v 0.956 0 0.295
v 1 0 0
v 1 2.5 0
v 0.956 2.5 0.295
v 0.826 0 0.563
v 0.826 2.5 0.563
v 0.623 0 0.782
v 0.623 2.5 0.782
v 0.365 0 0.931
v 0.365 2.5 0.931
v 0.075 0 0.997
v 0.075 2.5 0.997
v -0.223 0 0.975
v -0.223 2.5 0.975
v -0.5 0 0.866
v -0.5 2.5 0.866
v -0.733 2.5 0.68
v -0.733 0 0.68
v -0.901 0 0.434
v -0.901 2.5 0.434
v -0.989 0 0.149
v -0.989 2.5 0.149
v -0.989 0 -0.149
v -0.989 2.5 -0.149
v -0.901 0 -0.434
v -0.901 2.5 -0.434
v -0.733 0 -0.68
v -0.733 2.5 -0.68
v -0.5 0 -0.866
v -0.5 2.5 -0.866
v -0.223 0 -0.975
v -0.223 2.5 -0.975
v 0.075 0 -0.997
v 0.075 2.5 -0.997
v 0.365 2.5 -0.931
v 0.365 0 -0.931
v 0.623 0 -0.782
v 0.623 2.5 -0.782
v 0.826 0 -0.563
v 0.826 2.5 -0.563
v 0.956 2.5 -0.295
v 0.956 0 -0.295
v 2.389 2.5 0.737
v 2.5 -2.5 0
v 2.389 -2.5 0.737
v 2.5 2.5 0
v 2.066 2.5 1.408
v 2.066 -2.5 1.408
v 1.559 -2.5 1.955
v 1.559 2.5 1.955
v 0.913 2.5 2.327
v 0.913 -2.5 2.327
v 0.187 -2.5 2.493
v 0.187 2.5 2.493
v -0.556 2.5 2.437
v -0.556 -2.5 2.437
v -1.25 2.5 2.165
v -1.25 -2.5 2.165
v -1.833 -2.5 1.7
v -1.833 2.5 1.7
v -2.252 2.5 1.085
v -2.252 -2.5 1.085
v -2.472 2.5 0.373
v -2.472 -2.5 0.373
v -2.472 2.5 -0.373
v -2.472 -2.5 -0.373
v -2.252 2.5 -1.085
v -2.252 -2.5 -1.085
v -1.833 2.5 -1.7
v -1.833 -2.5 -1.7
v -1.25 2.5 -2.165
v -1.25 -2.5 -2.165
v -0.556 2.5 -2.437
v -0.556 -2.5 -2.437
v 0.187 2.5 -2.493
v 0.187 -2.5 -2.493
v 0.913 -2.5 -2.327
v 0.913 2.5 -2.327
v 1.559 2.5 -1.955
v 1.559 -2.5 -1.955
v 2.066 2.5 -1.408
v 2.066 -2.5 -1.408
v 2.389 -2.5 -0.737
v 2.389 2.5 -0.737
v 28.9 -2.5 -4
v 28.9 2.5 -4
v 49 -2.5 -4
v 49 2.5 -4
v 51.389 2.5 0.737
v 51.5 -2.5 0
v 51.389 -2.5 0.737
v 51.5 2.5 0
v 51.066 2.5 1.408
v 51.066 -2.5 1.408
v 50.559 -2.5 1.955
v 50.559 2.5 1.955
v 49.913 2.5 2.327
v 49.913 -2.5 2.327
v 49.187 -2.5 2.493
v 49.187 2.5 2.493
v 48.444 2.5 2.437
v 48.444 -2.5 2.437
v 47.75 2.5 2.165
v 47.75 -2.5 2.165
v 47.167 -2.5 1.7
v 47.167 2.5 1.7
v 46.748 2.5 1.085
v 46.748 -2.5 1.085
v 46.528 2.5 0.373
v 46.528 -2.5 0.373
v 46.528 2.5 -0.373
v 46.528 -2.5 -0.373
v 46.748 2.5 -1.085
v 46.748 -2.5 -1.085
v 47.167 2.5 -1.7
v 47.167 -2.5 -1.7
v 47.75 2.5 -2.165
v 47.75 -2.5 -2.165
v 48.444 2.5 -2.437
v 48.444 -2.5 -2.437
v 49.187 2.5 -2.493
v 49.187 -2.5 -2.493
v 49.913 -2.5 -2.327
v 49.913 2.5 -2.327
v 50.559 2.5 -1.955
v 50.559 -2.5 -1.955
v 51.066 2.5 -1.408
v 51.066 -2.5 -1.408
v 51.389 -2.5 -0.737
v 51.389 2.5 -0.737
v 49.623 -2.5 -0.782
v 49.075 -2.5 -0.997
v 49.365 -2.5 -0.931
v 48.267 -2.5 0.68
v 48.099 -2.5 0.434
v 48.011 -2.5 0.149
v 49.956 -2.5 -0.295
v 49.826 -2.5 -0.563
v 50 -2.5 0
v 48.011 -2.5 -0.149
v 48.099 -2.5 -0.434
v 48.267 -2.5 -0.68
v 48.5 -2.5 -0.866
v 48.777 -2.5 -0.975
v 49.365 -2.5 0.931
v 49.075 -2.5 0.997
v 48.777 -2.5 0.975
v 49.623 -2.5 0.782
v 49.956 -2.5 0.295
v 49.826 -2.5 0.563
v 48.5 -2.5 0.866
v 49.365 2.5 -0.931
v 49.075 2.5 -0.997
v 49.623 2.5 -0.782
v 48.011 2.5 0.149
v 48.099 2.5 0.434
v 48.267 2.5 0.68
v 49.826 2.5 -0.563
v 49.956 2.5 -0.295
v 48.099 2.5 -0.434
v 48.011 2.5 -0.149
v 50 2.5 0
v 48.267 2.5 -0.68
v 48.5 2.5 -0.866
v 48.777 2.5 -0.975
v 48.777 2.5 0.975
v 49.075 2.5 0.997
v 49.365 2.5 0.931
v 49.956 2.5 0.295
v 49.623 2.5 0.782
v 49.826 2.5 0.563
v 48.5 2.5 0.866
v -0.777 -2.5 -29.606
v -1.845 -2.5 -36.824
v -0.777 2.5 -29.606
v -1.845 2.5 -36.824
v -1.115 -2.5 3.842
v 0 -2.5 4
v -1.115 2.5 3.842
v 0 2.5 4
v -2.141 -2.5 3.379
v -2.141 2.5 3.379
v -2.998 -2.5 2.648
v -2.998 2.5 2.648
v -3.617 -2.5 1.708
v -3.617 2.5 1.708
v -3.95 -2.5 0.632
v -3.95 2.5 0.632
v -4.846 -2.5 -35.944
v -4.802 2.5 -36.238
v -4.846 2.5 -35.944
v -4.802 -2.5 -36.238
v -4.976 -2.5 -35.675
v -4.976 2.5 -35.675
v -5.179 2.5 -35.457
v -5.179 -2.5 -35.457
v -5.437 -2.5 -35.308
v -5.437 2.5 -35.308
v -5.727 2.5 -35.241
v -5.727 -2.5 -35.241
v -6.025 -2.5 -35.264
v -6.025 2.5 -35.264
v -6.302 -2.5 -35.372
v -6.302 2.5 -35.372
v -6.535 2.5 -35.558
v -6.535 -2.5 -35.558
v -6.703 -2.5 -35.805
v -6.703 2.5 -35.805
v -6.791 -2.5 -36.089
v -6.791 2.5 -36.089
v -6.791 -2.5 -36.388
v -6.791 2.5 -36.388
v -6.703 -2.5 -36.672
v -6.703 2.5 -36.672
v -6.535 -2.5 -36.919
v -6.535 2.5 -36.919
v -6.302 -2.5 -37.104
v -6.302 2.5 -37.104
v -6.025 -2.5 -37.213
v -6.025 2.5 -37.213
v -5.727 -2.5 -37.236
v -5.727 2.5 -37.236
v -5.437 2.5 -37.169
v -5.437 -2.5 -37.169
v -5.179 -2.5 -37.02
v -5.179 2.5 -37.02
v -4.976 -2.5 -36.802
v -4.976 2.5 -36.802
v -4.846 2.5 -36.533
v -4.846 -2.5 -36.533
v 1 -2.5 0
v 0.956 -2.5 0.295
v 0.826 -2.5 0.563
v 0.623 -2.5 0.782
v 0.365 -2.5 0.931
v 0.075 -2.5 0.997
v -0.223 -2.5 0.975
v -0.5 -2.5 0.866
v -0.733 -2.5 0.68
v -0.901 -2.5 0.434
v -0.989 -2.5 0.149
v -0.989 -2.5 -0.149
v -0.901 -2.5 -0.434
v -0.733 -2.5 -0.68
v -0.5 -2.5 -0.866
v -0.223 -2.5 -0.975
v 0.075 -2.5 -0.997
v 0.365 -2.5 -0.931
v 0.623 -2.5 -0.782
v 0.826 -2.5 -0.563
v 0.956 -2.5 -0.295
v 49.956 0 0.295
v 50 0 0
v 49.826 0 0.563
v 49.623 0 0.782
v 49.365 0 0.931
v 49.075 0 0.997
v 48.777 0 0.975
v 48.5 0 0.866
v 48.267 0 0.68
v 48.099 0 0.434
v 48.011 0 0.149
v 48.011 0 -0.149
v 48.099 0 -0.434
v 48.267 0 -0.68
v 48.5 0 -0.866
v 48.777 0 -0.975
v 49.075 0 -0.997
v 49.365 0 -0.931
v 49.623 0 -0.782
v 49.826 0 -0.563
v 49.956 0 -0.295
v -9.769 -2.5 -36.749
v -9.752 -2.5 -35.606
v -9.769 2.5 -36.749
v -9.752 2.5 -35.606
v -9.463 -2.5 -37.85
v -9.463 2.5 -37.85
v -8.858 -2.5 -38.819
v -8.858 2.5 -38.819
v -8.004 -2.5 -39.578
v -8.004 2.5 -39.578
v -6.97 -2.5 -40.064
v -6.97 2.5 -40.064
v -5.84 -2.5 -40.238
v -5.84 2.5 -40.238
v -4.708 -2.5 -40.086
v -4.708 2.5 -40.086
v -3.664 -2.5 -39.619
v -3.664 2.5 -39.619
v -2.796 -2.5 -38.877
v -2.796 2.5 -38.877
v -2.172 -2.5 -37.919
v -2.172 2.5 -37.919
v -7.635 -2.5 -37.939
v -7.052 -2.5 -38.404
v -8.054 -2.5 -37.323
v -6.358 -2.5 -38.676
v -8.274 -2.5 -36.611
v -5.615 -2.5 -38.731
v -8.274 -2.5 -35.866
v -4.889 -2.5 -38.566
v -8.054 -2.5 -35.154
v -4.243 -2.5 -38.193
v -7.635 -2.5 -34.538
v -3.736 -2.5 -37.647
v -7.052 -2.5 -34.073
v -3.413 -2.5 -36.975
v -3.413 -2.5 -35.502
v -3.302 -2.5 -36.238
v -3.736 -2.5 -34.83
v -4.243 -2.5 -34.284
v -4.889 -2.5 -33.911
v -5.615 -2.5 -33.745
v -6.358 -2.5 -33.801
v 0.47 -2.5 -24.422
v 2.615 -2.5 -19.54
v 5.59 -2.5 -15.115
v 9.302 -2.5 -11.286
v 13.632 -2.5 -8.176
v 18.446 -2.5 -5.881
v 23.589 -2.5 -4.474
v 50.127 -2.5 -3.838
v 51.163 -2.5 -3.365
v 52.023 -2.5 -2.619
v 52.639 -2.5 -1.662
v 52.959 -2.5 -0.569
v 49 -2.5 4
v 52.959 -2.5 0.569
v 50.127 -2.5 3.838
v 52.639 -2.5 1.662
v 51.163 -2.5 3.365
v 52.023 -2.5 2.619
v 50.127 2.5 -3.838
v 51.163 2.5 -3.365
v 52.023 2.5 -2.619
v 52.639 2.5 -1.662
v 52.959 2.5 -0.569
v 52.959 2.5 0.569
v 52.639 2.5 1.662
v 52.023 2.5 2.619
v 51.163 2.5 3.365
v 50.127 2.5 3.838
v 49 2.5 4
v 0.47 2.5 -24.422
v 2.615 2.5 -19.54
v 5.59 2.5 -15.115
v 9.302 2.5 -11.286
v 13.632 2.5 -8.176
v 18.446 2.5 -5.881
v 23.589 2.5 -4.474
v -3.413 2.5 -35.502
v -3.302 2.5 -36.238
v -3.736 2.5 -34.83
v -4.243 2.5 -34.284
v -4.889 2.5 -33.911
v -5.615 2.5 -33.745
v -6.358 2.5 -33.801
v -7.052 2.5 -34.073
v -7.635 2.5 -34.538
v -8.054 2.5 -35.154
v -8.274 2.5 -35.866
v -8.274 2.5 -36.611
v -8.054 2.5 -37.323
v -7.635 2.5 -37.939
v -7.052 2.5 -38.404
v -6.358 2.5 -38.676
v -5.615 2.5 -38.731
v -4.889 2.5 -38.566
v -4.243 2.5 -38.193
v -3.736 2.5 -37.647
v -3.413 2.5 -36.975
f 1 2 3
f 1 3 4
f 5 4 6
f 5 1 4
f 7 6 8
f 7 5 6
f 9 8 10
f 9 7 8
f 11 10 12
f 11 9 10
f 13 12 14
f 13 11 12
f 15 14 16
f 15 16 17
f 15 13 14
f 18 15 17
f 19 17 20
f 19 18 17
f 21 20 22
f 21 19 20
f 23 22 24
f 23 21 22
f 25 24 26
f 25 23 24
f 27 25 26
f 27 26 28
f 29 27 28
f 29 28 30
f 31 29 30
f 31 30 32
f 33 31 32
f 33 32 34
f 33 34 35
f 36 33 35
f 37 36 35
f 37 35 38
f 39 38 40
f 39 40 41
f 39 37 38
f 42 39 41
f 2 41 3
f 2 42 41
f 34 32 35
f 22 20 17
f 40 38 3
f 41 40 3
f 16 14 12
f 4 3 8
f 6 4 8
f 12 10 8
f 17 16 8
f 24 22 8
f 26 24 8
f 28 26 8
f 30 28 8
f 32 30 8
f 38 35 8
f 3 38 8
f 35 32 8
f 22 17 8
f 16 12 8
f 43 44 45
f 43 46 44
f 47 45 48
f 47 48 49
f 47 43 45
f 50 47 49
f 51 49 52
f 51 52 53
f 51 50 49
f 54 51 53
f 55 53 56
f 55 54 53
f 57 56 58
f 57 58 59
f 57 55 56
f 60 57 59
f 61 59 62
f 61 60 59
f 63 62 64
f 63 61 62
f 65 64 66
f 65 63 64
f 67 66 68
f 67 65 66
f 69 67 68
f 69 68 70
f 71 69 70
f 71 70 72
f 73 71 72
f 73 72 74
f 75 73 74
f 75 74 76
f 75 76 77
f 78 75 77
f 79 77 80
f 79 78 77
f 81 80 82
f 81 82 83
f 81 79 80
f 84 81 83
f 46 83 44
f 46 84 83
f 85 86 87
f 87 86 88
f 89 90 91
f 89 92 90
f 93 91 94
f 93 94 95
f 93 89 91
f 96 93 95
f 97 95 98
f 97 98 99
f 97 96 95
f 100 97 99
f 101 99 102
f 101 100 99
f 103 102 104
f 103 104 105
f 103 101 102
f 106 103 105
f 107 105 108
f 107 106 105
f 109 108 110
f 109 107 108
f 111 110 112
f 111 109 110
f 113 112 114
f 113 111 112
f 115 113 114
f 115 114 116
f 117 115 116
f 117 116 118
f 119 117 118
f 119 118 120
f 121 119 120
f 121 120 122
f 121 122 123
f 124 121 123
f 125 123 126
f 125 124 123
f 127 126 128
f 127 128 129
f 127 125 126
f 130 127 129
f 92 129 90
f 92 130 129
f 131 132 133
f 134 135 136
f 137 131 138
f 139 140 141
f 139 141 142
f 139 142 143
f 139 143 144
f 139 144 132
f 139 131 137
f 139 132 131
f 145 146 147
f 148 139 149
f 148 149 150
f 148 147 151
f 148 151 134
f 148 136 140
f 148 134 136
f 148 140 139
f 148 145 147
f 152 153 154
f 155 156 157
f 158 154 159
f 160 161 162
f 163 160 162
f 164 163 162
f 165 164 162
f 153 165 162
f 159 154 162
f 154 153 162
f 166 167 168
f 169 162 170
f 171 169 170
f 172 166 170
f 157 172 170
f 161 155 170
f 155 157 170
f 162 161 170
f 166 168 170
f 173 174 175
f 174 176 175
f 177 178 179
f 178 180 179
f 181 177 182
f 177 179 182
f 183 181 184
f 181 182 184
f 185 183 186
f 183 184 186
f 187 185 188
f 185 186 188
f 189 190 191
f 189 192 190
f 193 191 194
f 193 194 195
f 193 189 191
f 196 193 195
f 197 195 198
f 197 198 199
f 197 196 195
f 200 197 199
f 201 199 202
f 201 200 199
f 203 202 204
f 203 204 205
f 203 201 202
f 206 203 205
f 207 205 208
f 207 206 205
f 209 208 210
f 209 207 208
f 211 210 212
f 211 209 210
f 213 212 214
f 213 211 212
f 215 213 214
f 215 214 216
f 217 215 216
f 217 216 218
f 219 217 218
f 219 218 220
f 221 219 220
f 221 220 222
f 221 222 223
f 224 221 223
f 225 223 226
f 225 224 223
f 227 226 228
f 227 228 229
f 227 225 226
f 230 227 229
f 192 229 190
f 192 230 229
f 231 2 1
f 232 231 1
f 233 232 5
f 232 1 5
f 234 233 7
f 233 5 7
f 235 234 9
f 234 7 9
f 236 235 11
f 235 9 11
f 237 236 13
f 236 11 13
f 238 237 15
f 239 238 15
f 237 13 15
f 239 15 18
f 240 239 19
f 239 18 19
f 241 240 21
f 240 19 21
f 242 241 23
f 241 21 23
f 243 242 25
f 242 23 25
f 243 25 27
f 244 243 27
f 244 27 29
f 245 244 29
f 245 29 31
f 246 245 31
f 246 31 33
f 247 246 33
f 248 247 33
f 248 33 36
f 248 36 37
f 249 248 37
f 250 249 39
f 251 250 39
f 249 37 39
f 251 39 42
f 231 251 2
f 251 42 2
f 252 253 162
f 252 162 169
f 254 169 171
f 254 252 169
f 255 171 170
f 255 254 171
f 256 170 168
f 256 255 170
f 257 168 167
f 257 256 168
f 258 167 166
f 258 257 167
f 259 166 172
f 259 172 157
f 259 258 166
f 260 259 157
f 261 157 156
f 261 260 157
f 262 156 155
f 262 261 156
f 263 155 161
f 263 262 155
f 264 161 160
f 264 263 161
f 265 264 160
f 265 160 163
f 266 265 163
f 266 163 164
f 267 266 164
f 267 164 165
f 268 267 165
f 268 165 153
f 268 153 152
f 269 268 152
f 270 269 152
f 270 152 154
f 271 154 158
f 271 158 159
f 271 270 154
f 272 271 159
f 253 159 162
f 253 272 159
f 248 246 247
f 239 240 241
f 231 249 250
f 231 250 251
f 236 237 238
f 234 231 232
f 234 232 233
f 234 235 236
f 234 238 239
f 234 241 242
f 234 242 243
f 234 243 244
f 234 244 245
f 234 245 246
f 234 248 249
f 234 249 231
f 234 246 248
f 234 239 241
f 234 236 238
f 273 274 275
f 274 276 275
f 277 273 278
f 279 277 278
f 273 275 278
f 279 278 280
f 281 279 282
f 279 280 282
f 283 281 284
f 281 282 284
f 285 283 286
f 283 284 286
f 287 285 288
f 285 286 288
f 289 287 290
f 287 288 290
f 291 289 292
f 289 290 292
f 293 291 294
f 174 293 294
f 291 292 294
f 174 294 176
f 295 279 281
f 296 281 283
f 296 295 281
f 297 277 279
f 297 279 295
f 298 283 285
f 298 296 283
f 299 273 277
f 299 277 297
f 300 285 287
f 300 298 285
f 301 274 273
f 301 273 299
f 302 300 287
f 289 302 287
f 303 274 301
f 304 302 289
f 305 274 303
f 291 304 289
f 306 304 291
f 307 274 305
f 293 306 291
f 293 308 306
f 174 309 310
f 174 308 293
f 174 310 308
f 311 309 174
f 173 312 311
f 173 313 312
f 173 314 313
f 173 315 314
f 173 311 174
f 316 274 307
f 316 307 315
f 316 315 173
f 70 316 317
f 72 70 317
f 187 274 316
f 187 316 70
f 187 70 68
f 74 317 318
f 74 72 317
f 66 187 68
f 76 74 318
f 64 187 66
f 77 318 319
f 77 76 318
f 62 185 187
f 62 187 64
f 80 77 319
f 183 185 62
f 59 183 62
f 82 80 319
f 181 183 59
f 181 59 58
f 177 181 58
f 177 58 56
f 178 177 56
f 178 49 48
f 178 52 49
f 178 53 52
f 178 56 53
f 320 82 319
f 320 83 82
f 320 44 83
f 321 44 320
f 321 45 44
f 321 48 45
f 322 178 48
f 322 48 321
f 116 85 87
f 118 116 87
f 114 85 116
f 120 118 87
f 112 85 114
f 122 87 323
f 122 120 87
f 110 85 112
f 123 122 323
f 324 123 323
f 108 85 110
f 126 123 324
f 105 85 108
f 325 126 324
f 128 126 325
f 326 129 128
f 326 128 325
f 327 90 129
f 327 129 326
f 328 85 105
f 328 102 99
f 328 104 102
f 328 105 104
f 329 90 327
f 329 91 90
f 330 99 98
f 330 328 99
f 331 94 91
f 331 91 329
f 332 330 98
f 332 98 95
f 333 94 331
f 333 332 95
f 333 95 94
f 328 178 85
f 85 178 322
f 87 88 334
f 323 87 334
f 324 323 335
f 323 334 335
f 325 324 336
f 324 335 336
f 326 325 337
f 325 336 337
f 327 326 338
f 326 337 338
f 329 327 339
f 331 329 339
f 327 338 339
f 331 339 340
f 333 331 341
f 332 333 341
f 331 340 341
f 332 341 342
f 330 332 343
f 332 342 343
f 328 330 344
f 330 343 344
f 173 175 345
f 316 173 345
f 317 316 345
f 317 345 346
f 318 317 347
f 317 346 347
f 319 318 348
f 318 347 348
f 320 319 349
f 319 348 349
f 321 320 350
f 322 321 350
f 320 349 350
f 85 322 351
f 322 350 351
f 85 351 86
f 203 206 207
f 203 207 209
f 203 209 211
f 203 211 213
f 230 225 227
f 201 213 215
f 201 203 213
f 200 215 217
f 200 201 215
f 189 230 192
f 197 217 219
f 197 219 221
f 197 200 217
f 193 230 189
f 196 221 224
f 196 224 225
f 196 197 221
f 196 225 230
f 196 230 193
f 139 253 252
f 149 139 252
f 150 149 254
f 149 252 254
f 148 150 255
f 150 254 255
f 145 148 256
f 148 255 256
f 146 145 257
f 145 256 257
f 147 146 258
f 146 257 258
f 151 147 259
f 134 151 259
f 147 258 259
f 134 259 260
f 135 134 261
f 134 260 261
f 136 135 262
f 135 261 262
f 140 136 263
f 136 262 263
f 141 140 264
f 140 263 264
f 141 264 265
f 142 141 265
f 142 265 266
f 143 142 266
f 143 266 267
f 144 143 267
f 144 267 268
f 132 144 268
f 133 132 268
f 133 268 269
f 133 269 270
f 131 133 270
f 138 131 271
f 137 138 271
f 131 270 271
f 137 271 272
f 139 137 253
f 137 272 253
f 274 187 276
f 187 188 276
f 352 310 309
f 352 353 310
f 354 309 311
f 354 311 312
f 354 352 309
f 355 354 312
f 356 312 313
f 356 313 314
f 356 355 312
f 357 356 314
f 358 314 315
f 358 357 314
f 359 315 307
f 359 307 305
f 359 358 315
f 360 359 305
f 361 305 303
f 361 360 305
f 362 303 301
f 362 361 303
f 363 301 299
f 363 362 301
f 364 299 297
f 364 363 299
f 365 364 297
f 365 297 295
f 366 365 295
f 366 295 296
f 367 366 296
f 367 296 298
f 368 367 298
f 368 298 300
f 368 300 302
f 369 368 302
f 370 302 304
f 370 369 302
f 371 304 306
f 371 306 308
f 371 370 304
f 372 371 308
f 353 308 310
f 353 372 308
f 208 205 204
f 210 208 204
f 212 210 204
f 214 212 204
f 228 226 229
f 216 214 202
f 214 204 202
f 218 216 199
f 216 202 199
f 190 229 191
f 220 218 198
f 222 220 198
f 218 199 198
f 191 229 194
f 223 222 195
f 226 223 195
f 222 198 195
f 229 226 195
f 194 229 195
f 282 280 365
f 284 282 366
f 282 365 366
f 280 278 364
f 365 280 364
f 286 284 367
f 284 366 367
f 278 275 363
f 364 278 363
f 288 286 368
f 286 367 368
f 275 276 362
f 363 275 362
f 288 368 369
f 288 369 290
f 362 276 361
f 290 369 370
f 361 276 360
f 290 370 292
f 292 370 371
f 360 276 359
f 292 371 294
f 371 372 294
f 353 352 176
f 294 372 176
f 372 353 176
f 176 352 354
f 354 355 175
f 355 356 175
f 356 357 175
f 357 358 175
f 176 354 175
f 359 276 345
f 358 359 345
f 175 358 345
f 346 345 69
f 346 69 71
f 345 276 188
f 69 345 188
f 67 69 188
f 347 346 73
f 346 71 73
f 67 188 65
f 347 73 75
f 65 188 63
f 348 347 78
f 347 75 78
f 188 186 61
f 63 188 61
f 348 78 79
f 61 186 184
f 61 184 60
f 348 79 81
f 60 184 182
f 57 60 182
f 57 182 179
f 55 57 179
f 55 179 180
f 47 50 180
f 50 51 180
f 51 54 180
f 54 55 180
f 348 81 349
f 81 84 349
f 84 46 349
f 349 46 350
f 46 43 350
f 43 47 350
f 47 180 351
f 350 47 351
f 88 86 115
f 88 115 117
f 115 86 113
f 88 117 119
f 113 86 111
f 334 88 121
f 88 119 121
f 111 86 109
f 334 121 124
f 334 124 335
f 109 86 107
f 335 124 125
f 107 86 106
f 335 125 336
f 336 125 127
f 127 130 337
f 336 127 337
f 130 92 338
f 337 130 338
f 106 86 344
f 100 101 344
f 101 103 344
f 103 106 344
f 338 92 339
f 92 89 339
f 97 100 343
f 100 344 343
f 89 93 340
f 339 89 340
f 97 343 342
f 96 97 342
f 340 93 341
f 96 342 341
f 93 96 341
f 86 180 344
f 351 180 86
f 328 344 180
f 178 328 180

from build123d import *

# Parameters (mm, degrees)
F0_R     = 2.5
F0_R_2   = 1
F1_DEPTH = 2.5


with BuildPart() as f1:
    # F0 (on Front) → F1 (new body, symmetric)
    with BuildSketch(Plane.XZ):
        with BuildLine():
            Line((49, 4), (0, 4))
            ThreePointArc((0, 4), (-2.595236, 3.043805), (-3.949696, 0.632375))
            Line((-3.949696, 0.632375), (-9.751737, -35.60609))
            ThreePointArc((-9.751737, -35.60609), (-6.411156, -40.191815), (-1.845174, -36.824299))
            Line((-1.845174, -36.824299), (-0.776504, -29.606244))
            ThreePointArc((-0.776504, -29.606244), (9.301692, -11.286428), (28.9, -4))
            Line((28.9, -4), (49, -4))
            ThreePointArc((49, -4), (53, 0), (49, 4))
        make_face()
        with Locations((-5.802041, -36.238465)):
            Circle(F0_R, mode=Mode.SUBTRACT)
        Circle(F0_R, mode=Mode.SUBTRACT)
        with Locations((49, 0)):
            Circle(F0_R, mode=Mode.SUBTRACT)
        with Locations((49, 0)):
            Circle(F0_R_2)
        Circle(F0_R_2)
        with Locations((-5.802041, -36.238465)):
            Circle(F0_R_2)
    extrude(amount=F1_DEPTH, both=True)


solid = f1.part
